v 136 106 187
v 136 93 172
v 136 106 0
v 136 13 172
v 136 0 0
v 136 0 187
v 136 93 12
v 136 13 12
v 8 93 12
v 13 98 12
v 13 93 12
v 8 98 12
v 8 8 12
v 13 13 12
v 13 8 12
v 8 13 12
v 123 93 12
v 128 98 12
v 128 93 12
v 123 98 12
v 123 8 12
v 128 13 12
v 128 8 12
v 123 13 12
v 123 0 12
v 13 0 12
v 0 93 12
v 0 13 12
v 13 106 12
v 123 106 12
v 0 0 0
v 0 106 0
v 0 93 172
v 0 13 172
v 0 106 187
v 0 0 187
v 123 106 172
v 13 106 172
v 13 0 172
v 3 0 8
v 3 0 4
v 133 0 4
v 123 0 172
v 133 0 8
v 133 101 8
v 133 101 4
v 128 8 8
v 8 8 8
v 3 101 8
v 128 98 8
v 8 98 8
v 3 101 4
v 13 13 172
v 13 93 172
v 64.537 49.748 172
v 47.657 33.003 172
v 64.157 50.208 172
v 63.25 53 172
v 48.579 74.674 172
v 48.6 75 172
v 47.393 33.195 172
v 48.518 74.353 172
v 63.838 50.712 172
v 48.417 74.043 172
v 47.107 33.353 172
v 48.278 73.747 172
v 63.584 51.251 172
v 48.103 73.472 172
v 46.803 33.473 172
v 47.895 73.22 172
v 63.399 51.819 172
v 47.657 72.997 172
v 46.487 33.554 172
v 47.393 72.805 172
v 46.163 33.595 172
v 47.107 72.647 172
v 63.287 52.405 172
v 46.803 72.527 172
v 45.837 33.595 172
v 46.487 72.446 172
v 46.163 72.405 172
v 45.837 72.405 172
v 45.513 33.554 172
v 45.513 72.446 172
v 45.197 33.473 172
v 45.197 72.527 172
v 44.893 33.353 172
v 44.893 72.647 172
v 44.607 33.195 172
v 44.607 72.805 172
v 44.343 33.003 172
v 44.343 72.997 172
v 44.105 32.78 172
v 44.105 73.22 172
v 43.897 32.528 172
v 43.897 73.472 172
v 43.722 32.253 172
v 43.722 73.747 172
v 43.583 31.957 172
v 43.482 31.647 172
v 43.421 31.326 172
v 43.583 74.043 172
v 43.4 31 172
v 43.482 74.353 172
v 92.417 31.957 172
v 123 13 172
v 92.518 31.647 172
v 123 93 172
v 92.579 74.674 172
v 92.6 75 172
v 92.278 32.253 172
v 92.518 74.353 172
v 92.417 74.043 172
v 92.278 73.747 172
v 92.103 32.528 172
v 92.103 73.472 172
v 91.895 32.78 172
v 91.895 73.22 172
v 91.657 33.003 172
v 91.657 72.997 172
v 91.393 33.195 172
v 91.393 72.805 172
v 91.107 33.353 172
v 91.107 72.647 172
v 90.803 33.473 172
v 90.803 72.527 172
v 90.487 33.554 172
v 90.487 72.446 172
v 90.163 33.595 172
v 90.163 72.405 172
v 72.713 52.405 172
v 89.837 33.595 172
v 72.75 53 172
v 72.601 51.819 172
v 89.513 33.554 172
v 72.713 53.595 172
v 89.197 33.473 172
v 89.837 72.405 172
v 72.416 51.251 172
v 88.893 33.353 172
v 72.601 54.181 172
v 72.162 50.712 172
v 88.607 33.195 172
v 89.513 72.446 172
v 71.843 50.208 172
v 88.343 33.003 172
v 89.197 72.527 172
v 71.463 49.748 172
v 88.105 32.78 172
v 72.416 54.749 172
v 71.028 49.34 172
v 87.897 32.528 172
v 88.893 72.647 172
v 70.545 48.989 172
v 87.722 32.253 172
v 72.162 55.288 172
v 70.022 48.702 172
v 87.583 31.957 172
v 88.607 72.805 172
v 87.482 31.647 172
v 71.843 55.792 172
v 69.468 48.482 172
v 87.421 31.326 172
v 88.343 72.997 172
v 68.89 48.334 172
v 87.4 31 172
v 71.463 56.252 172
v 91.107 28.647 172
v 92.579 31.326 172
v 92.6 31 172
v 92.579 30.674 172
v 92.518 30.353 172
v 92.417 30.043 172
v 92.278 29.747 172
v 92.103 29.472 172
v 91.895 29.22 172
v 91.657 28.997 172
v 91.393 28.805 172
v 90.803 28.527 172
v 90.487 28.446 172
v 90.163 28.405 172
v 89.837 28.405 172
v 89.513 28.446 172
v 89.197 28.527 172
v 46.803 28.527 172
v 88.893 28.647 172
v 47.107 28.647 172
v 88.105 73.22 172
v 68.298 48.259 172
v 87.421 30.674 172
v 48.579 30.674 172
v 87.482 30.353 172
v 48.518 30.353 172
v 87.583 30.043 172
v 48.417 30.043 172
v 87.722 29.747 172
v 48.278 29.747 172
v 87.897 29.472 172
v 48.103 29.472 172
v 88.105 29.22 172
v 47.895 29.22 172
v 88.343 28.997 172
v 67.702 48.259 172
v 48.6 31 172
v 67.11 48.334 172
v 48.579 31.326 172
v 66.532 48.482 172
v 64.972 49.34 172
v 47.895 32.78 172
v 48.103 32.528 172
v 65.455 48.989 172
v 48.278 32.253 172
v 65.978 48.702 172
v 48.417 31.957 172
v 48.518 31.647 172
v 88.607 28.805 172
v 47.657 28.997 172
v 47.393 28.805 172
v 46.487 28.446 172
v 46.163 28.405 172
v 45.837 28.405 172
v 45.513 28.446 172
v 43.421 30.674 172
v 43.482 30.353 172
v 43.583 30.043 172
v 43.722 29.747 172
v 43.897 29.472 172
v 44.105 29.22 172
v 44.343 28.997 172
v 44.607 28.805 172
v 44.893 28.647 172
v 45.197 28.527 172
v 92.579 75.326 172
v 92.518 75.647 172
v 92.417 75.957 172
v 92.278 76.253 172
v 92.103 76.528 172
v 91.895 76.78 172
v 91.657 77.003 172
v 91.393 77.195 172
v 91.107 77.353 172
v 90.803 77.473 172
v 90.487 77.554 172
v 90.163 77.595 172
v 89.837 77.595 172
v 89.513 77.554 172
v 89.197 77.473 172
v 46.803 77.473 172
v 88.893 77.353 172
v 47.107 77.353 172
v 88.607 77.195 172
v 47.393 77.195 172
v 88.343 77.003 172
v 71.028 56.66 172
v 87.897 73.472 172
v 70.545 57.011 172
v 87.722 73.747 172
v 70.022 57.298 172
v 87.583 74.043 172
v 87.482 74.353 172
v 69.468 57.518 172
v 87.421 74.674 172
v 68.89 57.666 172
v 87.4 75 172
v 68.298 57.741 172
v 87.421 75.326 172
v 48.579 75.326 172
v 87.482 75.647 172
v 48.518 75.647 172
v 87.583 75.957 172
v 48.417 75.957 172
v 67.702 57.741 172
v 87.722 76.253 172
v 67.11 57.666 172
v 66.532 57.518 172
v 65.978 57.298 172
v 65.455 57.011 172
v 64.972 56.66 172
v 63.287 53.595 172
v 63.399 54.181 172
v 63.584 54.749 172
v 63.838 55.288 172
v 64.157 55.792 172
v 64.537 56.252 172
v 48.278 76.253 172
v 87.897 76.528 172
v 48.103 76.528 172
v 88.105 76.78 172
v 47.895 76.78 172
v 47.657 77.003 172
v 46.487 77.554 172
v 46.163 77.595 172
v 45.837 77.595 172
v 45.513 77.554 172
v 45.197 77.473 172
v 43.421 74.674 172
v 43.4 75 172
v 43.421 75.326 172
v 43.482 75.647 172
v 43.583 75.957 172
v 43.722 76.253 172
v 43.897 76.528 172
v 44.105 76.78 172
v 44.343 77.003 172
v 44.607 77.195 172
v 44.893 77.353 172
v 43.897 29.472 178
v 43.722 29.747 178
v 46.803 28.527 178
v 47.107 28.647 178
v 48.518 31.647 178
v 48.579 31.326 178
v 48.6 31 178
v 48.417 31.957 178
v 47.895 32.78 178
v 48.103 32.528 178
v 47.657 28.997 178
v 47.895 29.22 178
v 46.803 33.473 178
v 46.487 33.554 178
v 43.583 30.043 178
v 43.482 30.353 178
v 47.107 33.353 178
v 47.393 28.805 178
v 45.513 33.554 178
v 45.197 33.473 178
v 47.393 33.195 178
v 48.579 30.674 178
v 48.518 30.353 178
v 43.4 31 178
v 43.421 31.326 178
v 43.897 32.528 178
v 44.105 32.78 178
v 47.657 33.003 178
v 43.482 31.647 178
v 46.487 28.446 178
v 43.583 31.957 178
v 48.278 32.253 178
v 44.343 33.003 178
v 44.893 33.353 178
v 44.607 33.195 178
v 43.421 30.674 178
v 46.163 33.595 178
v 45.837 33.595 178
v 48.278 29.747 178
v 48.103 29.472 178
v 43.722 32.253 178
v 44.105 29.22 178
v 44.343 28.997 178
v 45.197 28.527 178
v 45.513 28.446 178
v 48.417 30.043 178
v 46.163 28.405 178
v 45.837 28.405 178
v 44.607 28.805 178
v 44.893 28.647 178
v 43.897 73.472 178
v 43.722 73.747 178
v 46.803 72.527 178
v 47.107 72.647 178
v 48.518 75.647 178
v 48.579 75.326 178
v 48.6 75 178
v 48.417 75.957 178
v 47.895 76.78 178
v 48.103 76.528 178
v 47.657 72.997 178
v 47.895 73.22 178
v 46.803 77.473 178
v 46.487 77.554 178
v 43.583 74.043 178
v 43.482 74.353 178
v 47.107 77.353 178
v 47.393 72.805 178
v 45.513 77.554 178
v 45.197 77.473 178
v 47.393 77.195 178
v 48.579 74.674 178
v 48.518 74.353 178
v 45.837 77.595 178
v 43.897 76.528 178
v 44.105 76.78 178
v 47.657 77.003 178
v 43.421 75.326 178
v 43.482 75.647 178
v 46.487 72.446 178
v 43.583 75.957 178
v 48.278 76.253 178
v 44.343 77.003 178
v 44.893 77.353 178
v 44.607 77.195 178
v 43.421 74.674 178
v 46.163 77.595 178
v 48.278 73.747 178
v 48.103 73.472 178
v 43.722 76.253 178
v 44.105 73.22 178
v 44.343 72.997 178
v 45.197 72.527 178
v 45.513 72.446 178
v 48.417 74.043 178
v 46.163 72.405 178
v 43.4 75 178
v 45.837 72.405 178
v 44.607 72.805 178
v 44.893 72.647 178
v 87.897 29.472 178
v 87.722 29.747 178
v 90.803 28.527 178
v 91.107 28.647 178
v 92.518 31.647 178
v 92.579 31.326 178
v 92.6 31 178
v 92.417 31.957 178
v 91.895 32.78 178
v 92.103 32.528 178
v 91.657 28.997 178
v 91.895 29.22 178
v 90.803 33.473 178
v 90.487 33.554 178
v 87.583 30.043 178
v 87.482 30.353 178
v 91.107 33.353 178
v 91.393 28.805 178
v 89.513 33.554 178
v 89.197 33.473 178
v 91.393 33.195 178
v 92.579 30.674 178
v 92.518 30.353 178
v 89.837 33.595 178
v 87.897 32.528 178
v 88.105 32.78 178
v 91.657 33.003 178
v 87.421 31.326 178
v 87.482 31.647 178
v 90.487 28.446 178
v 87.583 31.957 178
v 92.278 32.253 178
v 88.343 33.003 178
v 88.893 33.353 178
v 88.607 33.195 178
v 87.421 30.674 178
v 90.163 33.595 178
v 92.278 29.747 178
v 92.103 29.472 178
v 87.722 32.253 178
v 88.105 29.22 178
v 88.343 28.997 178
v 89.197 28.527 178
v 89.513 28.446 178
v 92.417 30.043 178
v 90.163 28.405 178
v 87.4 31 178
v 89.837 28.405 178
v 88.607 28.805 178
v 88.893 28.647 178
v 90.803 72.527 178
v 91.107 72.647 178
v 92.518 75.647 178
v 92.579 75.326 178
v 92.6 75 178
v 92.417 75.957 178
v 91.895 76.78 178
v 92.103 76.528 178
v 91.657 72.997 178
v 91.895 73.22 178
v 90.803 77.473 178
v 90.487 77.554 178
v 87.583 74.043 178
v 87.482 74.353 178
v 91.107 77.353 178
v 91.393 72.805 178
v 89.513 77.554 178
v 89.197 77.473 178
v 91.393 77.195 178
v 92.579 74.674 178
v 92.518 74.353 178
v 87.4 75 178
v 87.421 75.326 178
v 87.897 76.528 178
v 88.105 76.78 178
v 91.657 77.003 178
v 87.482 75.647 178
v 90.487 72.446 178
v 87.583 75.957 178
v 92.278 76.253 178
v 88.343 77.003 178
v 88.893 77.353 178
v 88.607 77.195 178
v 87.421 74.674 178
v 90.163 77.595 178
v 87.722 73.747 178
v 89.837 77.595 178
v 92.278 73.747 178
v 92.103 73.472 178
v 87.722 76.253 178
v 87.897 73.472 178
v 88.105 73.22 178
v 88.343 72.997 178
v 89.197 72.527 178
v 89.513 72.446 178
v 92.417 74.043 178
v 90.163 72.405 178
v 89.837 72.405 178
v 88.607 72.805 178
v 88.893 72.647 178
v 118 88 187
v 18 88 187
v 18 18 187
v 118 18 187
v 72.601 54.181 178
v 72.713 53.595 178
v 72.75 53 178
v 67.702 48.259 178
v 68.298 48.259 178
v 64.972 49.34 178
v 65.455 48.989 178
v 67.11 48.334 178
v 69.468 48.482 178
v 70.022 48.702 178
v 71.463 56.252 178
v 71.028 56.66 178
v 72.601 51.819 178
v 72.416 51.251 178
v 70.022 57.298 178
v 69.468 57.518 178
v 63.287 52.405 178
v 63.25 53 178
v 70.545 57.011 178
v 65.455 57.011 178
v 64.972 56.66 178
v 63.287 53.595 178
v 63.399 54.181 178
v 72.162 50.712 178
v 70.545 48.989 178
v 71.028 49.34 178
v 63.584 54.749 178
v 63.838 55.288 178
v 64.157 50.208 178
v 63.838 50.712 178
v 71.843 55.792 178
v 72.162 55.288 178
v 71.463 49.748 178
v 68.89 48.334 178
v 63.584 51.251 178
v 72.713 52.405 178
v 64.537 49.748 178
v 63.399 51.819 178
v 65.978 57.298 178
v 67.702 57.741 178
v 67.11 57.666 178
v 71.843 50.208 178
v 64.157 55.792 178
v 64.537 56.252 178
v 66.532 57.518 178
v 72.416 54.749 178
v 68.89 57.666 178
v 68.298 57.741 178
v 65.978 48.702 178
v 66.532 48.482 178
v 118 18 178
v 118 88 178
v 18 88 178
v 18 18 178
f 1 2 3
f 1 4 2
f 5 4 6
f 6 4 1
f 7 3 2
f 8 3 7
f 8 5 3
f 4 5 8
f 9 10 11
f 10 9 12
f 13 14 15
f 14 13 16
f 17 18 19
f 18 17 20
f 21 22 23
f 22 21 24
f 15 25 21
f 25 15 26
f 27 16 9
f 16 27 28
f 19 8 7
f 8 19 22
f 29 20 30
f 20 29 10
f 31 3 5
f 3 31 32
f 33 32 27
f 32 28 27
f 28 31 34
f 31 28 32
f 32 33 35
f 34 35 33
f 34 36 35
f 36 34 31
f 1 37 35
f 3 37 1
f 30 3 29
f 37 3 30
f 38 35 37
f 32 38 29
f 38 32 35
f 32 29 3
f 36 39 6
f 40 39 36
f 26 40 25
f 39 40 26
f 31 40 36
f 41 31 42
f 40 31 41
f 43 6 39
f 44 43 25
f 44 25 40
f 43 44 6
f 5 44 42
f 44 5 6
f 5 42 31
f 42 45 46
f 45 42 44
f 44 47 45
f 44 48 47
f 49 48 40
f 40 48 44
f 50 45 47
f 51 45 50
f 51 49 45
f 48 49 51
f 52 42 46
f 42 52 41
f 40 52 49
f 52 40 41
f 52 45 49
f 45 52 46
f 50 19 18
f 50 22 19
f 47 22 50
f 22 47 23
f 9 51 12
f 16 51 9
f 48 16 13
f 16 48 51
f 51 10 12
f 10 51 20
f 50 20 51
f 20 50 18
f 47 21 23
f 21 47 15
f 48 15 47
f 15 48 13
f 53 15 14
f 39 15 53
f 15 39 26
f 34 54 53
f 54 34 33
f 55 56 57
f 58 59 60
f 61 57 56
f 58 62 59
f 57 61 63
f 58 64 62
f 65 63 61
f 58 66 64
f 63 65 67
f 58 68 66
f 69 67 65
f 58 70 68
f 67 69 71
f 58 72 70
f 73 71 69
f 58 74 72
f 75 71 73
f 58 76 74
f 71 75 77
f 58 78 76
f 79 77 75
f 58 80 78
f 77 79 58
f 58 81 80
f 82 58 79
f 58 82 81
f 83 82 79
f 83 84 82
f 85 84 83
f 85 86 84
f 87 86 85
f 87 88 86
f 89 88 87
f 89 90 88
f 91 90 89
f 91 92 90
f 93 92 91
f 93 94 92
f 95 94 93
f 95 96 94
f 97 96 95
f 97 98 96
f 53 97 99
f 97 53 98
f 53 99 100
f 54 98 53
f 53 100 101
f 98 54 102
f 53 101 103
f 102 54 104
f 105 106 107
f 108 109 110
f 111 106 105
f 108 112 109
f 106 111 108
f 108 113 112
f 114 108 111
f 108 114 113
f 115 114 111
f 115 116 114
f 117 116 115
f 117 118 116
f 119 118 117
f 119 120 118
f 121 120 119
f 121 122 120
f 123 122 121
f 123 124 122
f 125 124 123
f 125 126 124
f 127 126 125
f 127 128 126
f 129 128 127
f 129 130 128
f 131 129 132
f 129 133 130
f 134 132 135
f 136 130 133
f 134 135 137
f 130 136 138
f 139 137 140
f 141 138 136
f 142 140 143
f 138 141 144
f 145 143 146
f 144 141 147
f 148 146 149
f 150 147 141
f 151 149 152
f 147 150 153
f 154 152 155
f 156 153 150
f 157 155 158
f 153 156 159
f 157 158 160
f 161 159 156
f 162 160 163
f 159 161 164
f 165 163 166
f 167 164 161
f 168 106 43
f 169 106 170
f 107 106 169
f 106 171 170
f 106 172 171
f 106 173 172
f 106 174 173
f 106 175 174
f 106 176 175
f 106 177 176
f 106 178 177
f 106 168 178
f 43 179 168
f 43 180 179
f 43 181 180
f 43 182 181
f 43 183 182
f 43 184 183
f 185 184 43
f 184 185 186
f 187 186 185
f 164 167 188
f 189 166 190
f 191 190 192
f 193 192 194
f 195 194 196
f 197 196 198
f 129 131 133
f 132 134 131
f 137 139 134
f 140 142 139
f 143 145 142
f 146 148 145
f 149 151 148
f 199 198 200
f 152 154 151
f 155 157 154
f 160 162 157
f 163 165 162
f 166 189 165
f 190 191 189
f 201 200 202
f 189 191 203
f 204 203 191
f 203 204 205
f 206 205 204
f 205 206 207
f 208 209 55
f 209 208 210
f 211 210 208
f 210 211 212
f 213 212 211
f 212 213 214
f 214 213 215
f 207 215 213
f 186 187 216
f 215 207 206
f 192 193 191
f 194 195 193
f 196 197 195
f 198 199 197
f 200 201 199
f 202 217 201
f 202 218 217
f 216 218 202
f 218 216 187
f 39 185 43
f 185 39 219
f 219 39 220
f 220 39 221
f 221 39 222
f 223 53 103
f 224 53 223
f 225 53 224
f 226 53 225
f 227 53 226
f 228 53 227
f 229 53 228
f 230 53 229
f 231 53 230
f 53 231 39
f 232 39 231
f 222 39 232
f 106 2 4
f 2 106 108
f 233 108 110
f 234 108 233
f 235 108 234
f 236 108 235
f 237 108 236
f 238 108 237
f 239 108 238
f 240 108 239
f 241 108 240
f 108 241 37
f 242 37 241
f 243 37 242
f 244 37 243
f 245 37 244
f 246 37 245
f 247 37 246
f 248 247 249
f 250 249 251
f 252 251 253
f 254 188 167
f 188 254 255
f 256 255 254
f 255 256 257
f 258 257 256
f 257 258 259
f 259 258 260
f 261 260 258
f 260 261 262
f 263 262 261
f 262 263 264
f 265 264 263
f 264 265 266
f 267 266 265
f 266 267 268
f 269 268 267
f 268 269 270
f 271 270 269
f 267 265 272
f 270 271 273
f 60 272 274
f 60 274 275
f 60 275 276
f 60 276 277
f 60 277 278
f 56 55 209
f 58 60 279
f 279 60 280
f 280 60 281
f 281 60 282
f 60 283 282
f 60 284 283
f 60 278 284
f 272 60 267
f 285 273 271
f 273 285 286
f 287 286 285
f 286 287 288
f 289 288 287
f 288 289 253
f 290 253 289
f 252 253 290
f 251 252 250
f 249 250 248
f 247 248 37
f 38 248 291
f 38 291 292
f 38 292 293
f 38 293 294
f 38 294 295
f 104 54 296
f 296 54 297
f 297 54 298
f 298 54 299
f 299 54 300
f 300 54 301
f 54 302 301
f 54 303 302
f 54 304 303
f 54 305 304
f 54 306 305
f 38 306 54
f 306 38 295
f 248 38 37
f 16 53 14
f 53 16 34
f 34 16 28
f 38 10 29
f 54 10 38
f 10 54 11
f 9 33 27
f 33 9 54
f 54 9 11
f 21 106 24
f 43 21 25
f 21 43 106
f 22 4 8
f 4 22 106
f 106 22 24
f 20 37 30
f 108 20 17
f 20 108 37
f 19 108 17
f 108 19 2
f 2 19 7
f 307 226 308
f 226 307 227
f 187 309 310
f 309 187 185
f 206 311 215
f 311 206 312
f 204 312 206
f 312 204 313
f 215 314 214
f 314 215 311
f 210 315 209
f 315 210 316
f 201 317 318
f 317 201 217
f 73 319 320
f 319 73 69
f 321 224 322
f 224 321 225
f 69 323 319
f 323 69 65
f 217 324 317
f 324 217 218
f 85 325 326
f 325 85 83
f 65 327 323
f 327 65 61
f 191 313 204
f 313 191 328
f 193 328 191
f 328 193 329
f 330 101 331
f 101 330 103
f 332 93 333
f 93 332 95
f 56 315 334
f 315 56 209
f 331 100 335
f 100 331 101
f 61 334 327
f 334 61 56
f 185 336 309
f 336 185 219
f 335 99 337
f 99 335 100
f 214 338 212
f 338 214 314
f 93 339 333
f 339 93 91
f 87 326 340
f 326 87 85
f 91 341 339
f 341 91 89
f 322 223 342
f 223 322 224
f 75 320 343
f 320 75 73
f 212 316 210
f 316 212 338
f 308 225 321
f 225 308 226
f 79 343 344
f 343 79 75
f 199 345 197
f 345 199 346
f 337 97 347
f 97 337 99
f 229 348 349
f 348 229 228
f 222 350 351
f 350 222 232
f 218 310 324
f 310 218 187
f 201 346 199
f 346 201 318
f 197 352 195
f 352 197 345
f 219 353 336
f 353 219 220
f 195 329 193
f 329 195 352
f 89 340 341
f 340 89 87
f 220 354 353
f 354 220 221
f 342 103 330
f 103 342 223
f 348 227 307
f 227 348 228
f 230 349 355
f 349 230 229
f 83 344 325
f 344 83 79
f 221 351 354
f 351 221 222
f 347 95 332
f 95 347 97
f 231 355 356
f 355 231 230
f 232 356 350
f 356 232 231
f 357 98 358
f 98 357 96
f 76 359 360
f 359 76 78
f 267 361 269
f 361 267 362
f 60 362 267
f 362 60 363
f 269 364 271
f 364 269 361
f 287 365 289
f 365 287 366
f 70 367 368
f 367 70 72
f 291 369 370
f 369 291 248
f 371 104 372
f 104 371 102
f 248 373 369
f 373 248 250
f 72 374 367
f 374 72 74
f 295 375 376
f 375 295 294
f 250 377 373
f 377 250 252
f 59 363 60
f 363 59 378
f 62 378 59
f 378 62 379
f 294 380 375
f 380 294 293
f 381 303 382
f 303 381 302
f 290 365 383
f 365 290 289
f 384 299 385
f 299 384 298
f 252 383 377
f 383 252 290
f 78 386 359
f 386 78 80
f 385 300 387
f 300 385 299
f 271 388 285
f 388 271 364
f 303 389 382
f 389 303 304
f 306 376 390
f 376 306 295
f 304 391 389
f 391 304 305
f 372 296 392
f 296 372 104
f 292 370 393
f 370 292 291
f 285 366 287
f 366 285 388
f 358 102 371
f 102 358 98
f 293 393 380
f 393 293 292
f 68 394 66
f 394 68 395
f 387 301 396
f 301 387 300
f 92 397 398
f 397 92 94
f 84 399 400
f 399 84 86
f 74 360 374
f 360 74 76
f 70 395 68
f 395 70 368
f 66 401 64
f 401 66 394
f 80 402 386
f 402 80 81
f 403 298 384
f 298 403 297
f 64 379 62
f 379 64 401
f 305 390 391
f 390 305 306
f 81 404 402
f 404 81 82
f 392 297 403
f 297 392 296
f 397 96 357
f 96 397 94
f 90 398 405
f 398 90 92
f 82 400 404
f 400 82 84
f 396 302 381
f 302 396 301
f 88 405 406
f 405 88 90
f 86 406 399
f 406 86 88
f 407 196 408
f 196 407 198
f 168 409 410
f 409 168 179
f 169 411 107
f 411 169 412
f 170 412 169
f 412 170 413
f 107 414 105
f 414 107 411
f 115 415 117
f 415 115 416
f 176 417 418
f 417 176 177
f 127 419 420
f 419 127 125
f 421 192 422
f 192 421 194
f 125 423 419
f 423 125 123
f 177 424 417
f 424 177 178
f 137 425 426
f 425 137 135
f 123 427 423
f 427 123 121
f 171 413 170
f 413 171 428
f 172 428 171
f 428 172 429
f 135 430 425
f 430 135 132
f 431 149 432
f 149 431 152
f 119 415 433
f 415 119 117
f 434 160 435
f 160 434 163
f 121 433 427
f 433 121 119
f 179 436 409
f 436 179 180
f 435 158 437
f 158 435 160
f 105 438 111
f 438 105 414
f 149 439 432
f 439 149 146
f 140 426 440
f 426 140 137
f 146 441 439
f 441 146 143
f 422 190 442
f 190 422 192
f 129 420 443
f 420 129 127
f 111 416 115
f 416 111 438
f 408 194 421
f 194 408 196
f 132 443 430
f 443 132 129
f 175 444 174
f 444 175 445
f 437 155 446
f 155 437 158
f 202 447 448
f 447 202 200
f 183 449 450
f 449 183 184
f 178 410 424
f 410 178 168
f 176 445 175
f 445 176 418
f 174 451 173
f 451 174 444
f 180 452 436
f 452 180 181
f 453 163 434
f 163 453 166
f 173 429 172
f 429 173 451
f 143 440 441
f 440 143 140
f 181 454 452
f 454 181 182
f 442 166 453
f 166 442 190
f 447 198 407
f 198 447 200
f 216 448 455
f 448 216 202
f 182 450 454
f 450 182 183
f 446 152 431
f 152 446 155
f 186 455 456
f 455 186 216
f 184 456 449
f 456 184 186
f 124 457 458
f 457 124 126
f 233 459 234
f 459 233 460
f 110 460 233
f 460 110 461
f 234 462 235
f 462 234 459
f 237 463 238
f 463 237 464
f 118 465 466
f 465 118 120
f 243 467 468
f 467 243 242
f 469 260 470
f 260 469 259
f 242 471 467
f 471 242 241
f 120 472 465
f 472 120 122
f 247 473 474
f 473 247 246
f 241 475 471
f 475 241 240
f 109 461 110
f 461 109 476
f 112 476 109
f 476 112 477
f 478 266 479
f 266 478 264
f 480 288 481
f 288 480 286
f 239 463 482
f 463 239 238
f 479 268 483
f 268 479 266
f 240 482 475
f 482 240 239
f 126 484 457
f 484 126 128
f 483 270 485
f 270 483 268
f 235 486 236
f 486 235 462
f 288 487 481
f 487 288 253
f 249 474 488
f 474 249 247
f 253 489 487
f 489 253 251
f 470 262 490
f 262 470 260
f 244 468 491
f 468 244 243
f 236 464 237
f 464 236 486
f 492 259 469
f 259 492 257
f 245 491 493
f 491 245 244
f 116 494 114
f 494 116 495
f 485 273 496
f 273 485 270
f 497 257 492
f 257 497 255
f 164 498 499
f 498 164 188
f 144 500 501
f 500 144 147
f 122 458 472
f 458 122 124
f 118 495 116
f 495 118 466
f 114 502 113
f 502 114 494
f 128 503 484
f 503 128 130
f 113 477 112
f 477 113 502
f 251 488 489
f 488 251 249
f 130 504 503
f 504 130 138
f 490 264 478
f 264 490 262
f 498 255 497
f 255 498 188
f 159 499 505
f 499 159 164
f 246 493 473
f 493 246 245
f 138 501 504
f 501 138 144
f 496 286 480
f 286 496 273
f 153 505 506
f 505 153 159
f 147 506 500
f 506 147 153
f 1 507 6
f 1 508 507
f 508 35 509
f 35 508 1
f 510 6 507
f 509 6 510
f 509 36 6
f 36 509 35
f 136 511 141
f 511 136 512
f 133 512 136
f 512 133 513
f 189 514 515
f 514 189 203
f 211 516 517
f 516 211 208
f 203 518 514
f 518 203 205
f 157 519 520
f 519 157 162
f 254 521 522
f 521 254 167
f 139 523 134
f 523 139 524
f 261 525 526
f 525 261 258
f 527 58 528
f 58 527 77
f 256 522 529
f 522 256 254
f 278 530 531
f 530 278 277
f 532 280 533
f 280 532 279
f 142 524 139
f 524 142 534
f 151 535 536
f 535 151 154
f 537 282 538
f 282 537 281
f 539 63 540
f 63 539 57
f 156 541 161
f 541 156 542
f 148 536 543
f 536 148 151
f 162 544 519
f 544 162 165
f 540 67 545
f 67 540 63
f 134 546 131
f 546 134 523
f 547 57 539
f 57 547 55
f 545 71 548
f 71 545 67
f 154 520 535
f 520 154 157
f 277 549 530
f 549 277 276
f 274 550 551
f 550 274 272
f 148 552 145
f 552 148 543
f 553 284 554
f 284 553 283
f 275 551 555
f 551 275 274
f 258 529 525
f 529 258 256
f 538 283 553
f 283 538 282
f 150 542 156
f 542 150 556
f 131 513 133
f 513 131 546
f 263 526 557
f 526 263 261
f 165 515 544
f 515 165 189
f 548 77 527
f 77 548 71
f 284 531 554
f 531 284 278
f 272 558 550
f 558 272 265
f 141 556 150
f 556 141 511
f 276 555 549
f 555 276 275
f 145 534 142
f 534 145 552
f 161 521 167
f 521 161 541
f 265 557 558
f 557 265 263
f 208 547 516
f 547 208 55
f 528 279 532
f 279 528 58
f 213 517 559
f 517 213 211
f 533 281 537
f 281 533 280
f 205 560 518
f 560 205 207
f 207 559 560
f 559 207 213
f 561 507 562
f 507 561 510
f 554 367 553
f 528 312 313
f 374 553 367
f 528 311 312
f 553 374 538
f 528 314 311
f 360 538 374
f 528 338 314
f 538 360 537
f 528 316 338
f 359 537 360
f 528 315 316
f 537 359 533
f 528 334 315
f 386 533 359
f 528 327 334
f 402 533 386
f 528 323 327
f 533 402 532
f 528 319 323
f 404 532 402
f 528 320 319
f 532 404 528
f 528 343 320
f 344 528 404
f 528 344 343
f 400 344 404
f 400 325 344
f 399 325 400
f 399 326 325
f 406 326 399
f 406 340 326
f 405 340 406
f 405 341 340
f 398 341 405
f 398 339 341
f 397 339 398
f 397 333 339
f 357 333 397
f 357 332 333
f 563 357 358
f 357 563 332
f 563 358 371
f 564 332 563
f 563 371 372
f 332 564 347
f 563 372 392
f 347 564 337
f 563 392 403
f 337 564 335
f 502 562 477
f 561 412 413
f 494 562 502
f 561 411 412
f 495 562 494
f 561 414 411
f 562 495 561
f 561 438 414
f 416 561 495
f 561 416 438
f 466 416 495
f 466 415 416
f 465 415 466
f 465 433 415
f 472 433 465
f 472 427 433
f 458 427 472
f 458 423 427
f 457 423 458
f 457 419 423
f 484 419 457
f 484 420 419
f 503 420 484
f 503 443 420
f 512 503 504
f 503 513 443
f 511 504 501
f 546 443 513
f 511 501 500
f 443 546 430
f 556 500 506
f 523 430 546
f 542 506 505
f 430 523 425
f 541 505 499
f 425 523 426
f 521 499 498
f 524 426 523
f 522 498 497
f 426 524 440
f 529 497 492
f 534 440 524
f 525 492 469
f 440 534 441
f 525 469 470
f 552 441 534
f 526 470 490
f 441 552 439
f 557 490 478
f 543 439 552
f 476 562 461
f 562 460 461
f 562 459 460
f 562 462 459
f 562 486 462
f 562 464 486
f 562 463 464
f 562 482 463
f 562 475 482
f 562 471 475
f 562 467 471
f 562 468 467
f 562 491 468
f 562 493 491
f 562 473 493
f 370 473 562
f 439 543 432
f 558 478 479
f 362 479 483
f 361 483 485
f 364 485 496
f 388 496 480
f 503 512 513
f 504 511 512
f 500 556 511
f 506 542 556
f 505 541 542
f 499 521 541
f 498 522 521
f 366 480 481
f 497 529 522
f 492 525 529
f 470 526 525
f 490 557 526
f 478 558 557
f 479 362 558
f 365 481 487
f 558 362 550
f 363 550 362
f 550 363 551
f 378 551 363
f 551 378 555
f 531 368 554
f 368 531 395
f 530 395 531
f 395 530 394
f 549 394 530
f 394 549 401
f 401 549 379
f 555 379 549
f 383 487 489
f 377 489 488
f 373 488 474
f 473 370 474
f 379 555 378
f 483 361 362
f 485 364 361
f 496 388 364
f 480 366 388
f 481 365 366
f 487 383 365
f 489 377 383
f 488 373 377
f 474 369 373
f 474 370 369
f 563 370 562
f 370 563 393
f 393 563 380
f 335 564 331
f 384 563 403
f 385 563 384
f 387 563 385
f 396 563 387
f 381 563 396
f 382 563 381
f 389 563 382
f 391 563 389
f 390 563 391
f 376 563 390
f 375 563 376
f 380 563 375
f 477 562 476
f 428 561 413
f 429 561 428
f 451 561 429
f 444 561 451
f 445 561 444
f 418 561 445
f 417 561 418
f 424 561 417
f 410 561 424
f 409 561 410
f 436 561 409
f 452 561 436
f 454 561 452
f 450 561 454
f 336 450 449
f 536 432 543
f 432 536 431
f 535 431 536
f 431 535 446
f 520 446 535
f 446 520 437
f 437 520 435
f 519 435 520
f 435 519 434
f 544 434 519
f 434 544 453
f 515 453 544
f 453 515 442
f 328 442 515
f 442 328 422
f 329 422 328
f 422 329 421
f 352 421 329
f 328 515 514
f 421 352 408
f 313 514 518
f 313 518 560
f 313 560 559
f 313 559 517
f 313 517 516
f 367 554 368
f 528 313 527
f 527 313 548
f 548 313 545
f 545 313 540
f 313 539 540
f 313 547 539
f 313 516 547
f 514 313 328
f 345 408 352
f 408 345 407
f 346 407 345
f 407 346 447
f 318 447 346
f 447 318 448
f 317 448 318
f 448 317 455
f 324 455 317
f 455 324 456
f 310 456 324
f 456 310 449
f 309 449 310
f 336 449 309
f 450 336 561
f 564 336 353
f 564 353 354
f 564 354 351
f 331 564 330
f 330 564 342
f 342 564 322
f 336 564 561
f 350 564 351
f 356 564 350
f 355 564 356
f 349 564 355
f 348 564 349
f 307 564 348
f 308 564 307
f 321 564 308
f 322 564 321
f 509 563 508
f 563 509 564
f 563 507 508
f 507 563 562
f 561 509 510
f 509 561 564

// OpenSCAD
$fn = 50;
larghezza_piastra = 130;
profondita_piastra = 100;
distanza_focale = 160;
spessore = 3;

module guida_piastra() {
    difference() {
        cube([larghezza_piastra + (spessore * 2), profondita_piastra + (spessore * 2), 12]);
        translate([spessore, -1, 4]) cube([larghezza_piastra, profondita_piastra + 2, 4]);
        translate([spessore + 5, spessore + 5, 7]) cube([larghezza_piastra - 10, profondita_piastra - 10, 10]);
    }
}

module tetto_ottico() {
    difference() {
        cube([larghezza_piastra + (spessore * 2), profondita_piastra + (spessore * 2), 15]);
        translate([(larghezza_piastra / 2) + spessore, (profondita_piastra / 2) + spessore, -1])
            cylinder(h = 20, d = 9.5);
        for (dx = [-22, 22], dy = [-22, 22]) {
            translate([(larghezza_piastra / 2) + spessore + dx, (profondita_piastra / 2) + spessore + dy, -1])
                cylinder(h = 20, d = 5.2);
        }
        translate([spessore + 15, spessore + 15, 6])
            cube([larghezza_piastra - 30, profondita_piastra - 30, 12]);
    }
}

union() {
    guida_piastra();
    for (x = [0, larghezza_piastra - 10 + spessore], y = [0, profondita_piastra - 10 + spessore]) {
        translate([x, y, 12]) cube([10 + spessore, 10 + spessore, distanza_focale]);
    }
    translate([0, 0, distanza_focale + 12]) tetto_ottico();
}
